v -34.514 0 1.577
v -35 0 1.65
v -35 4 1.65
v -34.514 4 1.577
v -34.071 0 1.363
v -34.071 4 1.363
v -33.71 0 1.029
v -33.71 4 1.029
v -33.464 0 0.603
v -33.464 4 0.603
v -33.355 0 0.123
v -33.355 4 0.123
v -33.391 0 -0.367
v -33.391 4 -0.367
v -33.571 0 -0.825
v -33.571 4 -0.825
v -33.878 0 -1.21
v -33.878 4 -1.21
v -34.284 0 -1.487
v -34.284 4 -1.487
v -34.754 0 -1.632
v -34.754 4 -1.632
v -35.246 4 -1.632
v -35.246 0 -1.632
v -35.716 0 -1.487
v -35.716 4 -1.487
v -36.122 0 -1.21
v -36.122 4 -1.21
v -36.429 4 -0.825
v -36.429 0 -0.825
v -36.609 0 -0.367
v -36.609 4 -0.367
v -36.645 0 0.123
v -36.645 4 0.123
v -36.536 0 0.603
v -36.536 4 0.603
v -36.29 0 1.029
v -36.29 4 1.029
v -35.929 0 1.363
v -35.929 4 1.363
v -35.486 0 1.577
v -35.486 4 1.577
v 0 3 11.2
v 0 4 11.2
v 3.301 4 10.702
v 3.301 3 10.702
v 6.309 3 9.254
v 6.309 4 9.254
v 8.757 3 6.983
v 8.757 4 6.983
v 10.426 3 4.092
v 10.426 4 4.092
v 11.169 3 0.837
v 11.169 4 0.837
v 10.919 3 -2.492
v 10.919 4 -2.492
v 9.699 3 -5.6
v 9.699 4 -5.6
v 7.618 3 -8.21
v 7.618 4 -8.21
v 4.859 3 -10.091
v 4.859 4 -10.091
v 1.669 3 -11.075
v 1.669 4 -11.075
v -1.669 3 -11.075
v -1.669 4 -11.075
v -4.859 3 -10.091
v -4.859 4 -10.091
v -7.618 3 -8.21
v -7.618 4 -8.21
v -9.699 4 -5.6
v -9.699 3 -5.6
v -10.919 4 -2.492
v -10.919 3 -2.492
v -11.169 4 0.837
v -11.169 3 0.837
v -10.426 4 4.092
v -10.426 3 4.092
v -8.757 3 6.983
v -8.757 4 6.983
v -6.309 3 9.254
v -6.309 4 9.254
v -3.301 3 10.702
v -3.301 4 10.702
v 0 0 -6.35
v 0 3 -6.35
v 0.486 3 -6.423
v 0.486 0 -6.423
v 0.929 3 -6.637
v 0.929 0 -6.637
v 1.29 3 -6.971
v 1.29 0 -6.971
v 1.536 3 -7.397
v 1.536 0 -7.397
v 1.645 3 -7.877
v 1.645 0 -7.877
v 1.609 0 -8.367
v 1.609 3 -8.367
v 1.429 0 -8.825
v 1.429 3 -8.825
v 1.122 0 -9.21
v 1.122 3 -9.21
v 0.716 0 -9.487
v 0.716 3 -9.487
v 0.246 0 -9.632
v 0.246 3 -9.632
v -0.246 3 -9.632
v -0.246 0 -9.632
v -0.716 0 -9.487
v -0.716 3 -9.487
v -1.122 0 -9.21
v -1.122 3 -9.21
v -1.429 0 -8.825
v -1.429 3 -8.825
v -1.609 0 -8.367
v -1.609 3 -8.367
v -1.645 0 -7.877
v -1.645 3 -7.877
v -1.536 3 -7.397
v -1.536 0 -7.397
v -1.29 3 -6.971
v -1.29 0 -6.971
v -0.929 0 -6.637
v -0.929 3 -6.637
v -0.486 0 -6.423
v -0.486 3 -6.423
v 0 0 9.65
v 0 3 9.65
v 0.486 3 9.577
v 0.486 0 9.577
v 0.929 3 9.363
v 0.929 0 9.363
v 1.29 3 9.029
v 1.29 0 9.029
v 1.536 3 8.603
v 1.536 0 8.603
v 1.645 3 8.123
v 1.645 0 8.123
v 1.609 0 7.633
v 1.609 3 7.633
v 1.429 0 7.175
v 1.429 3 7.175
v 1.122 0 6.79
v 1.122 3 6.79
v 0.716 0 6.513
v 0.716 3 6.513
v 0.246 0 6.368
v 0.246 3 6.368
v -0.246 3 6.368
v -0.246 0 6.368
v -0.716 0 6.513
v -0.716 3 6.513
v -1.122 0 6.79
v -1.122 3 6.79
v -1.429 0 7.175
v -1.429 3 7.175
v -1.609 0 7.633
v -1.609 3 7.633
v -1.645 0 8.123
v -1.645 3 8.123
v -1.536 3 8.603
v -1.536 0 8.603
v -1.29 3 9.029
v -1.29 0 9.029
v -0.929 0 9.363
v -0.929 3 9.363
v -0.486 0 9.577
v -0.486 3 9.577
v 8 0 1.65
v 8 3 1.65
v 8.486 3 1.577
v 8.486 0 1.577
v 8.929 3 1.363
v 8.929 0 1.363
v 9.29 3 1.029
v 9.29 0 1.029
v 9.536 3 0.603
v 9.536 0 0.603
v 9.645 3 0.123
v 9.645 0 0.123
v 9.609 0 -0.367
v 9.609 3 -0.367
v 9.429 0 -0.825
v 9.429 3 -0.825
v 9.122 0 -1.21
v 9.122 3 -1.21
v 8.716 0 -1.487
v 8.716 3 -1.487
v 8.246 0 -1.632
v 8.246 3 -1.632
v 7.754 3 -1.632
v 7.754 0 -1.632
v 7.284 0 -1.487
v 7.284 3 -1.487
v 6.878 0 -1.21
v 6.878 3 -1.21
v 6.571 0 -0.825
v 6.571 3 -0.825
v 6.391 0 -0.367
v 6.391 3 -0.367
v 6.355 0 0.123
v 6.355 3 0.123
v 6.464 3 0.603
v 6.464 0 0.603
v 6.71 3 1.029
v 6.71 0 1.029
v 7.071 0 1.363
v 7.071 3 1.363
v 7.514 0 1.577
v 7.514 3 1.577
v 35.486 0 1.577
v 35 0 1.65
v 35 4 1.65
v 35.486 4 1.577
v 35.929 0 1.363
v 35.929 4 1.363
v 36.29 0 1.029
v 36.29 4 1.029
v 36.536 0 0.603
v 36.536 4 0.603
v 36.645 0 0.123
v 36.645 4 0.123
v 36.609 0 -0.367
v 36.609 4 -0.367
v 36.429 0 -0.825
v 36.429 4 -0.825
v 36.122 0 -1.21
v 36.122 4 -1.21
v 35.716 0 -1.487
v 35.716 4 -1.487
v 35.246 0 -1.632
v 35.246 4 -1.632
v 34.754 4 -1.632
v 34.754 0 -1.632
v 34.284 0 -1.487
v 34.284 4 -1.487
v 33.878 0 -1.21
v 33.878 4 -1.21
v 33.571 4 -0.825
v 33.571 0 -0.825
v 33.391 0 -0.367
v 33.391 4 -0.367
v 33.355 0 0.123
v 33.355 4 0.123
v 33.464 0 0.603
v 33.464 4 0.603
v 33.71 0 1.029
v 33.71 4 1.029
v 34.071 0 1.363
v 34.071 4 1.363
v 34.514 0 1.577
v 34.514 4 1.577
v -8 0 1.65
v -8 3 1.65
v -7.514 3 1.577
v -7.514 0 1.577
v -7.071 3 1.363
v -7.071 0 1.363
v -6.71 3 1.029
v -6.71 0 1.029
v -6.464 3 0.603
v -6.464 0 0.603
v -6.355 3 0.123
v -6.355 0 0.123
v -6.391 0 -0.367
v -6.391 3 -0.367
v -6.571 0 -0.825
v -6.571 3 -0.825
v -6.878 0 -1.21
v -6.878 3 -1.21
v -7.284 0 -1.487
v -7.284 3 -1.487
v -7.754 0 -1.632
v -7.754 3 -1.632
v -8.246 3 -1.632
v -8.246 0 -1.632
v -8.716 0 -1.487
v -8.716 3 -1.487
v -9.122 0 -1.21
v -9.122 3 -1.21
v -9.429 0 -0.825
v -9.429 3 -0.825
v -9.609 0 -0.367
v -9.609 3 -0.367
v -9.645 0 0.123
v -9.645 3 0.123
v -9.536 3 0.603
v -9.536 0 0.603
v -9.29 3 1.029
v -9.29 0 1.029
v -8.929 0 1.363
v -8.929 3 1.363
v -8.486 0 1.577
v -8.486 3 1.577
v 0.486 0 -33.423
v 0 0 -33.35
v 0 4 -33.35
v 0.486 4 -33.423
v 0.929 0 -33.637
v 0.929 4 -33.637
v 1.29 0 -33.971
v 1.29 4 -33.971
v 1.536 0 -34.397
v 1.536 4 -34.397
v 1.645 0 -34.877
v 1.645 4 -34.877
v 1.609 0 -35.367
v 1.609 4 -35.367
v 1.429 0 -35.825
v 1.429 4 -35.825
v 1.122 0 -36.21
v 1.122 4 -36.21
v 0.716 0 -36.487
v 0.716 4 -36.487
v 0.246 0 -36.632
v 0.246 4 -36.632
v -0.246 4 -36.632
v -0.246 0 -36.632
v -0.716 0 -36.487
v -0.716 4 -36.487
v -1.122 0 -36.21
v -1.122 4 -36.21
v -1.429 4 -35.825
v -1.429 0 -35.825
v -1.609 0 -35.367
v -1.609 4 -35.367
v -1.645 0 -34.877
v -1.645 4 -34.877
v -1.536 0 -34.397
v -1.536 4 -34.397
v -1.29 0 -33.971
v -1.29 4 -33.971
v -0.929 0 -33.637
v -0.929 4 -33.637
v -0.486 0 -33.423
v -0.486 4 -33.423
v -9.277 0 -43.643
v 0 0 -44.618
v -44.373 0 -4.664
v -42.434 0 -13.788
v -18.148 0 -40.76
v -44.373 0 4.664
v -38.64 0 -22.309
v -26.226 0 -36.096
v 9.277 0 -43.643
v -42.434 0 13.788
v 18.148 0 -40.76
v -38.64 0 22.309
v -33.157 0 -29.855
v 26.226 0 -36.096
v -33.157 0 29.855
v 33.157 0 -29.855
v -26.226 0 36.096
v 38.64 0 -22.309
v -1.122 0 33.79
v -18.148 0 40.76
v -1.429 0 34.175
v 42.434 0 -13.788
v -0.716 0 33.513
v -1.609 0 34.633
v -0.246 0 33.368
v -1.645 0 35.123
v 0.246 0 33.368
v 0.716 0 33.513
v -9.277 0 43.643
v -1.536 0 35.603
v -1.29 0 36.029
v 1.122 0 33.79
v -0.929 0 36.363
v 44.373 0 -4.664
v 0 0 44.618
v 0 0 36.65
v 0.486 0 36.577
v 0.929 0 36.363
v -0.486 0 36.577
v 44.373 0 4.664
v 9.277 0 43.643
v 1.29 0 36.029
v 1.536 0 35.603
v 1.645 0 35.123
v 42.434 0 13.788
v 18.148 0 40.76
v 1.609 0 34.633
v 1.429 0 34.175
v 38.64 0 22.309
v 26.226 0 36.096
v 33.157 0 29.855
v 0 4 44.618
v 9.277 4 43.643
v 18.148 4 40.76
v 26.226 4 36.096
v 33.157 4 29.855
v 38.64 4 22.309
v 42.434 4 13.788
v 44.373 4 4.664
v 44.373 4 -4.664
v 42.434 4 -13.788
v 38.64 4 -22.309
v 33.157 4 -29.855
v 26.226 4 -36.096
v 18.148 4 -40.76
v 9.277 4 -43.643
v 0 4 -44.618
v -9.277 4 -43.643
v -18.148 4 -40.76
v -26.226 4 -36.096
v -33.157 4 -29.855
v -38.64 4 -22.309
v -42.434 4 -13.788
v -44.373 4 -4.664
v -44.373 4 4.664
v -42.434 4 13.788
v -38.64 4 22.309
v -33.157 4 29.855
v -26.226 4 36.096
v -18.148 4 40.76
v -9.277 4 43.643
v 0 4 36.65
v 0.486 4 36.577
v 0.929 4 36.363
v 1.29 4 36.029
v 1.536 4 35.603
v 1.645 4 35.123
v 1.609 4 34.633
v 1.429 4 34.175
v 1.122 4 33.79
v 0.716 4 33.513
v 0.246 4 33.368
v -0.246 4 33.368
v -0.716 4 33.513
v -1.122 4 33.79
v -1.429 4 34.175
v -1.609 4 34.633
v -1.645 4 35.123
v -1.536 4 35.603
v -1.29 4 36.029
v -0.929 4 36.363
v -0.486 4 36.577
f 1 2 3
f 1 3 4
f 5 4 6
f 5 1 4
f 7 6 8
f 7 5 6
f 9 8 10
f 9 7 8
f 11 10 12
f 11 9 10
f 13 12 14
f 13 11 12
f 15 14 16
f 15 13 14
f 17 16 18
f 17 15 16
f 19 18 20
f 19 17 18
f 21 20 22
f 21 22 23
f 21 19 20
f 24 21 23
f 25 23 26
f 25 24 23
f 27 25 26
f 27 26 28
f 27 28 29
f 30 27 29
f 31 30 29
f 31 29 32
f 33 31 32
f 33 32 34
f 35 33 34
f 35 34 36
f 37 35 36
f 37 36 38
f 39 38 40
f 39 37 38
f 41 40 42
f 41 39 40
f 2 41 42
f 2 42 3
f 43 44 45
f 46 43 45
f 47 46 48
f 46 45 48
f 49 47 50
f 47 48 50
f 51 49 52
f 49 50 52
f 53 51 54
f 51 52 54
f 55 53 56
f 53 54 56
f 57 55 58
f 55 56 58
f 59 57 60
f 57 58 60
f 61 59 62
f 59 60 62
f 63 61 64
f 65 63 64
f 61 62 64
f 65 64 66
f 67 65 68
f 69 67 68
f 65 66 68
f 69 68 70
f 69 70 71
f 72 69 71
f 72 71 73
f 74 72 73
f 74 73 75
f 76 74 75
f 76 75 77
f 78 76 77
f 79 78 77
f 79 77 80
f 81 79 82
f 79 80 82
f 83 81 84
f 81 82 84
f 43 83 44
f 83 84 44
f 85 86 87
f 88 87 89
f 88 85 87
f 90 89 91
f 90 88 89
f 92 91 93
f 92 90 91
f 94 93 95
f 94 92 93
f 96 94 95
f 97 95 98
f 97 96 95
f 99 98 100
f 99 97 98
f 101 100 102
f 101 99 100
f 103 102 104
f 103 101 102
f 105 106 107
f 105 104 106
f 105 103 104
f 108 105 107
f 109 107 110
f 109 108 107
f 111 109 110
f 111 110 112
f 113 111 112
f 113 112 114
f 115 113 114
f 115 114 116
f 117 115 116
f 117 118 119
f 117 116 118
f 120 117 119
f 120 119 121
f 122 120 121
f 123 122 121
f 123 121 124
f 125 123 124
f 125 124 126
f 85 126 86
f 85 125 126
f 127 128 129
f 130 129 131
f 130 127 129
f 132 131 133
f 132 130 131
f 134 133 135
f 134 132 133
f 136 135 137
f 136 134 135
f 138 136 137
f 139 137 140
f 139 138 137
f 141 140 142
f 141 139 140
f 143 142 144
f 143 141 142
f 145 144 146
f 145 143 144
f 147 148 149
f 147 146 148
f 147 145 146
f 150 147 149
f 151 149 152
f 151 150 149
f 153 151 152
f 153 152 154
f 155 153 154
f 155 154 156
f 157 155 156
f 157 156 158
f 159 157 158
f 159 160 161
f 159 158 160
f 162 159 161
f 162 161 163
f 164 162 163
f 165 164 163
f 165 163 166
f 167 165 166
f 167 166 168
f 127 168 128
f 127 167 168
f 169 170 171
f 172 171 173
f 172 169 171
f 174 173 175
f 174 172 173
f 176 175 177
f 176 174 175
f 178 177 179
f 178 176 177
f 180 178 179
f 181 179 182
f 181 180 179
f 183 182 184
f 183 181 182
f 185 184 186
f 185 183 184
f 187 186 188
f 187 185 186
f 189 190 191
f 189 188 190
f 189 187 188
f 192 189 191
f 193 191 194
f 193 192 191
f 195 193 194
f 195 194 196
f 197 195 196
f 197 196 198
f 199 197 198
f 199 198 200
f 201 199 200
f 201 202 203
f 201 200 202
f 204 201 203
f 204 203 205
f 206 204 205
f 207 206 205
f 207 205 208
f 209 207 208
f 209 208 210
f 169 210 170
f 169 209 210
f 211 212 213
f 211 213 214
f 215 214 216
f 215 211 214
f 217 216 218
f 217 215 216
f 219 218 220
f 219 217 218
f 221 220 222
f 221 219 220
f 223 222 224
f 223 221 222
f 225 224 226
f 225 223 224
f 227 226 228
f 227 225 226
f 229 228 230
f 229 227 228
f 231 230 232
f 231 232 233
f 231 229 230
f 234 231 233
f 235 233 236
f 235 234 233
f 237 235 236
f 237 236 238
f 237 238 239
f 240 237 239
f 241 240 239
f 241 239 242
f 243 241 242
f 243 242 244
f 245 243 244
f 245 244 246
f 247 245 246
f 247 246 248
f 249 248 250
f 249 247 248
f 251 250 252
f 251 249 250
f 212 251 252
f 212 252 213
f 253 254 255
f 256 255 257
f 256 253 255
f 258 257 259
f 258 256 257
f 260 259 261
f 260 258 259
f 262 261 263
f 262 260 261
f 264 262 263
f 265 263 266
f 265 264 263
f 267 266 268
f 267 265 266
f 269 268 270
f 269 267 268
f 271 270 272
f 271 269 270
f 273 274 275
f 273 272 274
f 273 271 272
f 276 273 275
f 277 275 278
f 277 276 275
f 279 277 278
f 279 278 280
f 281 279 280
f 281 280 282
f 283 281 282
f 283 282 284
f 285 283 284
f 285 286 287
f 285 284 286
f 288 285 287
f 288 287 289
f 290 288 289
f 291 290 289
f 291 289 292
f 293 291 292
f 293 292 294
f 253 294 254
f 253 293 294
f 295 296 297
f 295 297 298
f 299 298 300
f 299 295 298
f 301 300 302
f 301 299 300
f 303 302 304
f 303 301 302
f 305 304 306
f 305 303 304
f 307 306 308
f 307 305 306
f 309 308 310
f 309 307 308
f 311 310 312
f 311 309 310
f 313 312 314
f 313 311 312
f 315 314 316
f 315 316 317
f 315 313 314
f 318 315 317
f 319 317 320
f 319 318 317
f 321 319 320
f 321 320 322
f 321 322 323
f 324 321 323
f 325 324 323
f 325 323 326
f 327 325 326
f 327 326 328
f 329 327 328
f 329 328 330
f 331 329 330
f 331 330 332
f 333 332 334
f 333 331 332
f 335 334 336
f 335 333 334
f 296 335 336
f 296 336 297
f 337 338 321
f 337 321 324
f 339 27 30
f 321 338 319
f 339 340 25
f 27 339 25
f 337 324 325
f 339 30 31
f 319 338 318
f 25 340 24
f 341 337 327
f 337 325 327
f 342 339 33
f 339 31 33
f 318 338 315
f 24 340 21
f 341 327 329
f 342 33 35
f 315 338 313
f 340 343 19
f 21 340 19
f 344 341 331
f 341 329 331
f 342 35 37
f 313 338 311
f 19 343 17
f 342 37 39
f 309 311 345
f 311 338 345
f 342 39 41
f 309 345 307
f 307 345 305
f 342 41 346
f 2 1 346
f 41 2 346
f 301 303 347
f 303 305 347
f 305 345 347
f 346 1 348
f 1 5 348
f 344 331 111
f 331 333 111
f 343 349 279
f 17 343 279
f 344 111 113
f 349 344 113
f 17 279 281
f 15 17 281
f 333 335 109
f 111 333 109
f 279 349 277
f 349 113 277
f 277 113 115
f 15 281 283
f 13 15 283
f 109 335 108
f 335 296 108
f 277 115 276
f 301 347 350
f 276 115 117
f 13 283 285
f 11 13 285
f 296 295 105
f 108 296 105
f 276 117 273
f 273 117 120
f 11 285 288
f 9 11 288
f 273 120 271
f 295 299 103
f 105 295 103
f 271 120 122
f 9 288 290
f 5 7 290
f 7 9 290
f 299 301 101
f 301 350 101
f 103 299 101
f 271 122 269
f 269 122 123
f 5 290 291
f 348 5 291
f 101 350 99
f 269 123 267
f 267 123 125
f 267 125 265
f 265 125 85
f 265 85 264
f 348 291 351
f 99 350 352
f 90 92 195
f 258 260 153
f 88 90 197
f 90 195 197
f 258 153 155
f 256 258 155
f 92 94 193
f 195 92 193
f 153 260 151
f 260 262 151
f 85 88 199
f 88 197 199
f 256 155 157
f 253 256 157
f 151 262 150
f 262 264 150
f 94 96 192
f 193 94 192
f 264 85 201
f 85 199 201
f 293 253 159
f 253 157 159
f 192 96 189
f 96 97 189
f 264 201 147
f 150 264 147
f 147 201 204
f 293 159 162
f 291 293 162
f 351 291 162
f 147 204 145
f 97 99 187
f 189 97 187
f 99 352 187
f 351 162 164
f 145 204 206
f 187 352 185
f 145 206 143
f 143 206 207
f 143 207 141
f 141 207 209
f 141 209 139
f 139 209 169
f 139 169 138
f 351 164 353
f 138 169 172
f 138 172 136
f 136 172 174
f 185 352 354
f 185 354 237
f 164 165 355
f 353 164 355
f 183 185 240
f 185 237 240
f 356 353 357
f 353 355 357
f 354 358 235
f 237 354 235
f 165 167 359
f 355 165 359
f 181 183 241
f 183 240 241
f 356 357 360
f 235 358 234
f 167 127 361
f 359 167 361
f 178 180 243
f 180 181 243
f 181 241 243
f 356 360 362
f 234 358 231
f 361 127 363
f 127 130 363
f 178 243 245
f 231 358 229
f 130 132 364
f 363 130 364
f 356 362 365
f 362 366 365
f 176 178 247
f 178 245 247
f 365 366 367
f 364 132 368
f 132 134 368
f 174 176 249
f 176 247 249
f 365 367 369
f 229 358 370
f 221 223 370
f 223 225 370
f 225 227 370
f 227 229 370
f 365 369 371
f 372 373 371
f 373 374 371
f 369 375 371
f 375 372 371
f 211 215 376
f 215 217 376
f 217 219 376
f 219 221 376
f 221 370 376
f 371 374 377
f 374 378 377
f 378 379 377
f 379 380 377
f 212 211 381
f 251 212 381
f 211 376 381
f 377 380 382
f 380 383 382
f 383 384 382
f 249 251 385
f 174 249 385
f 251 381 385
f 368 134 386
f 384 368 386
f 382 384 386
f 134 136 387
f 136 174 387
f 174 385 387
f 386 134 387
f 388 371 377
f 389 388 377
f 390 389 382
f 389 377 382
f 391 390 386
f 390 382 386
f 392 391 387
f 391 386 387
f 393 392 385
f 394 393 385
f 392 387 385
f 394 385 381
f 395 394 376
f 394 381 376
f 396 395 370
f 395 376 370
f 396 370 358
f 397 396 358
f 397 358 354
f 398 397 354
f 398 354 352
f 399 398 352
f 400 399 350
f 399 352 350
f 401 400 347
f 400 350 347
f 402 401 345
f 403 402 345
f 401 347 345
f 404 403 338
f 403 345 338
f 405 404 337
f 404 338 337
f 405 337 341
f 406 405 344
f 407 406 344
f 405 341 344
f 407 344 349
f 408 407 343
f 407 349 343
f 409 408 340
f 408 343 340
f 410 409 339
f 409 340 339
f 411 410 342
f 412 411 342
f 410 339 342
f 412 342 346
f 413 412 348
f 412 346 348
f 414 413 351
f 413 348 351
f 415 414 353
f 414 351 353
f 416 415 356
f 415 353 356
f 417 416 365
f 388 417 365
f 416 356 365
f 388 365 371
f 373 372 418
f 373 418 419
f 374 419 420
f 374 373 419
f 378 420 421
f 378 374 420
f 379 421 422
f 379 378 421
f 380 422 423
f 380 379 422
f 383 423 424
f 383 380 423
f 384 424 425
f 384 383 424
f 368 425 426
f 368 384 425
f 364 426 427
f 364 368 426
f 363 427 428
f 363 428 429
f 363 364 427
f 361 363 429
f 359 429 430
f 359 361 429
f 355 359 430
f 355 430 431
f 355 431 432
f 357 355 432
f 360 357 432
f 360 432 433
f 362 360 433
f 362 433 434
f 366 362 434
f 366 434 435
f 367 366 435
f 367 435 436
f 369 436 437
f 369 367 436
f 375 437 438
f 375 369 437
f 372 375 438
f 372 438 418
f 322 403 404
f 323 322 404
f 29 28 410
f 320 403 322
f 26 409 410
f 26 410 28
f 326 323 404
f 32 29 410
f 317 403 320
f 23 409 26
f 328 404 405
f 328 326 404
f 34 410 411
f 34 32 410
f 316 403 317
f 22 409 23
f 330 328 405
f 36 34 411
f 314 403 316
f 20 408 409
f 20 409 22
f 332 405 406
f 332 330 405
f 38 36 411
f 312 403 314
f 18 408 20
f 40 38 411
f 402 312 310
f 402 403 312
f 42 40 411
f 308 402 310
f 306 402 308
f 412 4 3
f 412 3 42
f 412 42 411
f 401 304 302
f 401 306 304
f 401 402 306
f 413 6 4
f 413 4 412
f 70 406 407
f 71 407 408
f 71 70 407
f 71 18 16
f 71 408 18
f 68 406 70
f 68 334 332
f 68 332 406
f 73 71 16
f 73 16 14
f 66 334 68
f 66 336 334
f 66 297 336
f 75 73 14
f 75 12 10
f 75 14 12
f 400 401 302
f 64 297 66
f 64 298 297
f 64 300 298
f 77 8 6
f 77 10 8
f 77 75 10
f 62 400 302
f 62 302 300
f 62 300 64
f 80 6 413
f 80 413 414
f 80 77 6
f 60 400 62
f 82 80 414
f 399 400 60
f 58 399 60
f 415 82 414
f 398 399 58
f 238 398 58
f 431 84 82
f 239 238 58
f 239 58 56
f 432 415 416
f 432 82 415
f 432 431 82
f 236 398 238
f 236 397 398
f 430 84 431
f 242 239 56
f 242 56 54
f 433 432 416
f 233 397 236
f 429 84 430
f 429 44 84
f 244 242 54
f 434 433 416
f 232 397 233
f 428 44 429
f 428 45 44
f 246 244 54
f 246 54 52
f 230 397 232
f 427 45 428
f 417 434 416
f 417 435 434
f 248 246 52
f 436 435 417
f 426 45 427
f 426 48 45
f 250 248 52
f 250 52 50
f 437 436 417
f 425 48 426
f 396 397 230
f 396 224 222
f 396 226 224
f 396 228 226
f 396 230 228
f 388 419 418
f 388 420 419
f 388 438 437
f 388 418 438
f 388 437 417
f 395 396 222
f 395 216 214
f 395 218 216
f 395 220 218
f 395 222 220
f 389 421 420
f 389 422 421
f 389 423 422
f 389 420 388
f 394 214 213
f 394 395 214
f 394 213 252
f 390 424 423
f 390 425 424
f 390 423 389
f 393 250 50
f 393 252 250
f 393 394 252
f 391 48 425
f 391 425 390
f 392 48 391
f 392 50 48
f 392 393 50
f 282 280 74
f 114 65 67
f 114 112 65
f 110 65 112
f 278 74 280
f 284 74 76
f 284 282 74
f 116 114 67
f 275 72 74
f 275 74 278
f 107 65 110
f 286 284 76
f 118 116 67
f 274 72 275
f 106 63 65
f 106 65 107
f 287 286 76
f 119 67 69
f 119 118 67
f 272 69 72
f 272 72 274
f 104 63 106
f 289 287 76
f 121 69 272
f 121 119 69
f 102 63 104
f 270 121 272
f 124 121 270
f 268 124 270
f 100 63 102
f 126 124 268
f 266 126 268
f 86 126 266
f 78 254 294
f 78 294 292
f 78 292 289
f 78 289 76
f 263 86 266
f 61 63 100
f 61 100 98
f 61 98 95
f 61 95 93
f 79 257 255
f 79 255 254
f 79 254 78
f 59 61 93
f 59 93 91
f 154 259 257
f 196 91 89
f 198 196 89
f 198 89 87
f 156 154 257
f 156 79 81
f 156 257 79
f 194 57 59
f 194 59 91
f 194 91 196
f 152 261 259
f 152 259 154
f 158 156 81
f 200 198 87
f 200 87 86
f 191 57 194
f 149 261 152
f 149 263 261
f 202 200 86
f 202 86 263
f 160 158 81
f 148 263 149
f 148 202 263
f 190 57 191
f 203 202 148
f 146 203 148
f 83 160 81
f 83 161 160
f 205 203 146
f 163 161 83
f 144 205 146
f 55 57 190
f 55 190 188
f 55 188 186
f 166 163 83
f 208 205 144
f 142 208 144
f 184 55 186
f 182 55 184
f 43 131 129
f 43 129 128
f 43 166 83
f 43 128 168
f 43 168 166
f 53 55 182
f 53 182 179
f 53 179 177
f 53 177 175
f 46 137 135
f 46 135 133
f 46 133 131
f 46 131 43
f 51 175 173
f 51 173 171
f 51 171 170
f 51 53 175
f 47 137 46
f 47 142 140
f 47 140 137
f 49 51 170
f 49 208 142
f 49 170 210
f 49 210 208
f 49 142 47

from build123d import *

# Parameters (mm, degrees)
SKETCH1_R           = 44.617697353
SKETCH1_R_2         = 1.65
BOSS_EXTRUDE1_DEPTH = 4
SKETCH2_R           = 11.2
CUT_EXTRUDE1_DEPTH  = 1


with BuildPart() as part:
    # Sketch1 → Boss-Extrude1 (new body)
    with BuildSketch(Plane(origin=(0, 0, 0), x_dir=(1, 0, 0), z_dir=(0, 1, 0))):
        with Locations(Location((0, 0, 0), (0, 0, 270))):
            Circle(SKETCH1_R)
        with Locations(Location((0, 8, 0), (0, 0, 270))):
            Circle(SKETCH1_R_2, mode=Mode.SUBTRACT)
        with Locations(Location((8, 0, 0), (0, 0, 270))):
            Circle(SKETCH1_R_2, mode=Mode.SUBTRACT)
        with Locations(Location((0, -8, 0), (0, 0, 270))):
            Circle(SKETCH1_R_2, mode=Mode.SUBTRACT)
        with Locations(Location((-8, 0, 0), (0, 0, 270))):
            Circle(SKETCH1_R_2, mode=Mode.SUBTRACT)
        with Locations(Location((0, 35, 0), (0, 0, 270))):
            Circle(SKETCH1_R_2, mode=Mode.SUBTRACT)
        with Locations(Location((35, 0, 0), (0, 0, 270))):
            Circle(SKETCH1_R_2, mode=Mode.SUBTRACT)
        with Locations(Location((0, -35, 0), (0, 0, 270))):
            Circle(SKETCH1_R_2, mode=Mode.SUBTRACT)
        with Locations(Location((-35, 0, 0), (0, 0, 270))):
            Circle(SKETCH1_R_2, mode=Mode.SUBTRACT)
    extrude(amount=BOSS_EXTRUDE1_DEPTH)

    # Sketch2 → Cut-Extrude1 (cut)
    with BuildSketch(Plane(origin=(0, 4, 0), x_dir=(1, 0, 0), z_dir=(0, 1, 0))):
        with Locations(Location((0, 0, 0), (0, 0, 270))):
            Circle(SKETCH2_R)
    extrude(amount=-CUT_EXTRUDE1_DEPTH, mode=Mode.SUBTRACT)


solid = part.part
